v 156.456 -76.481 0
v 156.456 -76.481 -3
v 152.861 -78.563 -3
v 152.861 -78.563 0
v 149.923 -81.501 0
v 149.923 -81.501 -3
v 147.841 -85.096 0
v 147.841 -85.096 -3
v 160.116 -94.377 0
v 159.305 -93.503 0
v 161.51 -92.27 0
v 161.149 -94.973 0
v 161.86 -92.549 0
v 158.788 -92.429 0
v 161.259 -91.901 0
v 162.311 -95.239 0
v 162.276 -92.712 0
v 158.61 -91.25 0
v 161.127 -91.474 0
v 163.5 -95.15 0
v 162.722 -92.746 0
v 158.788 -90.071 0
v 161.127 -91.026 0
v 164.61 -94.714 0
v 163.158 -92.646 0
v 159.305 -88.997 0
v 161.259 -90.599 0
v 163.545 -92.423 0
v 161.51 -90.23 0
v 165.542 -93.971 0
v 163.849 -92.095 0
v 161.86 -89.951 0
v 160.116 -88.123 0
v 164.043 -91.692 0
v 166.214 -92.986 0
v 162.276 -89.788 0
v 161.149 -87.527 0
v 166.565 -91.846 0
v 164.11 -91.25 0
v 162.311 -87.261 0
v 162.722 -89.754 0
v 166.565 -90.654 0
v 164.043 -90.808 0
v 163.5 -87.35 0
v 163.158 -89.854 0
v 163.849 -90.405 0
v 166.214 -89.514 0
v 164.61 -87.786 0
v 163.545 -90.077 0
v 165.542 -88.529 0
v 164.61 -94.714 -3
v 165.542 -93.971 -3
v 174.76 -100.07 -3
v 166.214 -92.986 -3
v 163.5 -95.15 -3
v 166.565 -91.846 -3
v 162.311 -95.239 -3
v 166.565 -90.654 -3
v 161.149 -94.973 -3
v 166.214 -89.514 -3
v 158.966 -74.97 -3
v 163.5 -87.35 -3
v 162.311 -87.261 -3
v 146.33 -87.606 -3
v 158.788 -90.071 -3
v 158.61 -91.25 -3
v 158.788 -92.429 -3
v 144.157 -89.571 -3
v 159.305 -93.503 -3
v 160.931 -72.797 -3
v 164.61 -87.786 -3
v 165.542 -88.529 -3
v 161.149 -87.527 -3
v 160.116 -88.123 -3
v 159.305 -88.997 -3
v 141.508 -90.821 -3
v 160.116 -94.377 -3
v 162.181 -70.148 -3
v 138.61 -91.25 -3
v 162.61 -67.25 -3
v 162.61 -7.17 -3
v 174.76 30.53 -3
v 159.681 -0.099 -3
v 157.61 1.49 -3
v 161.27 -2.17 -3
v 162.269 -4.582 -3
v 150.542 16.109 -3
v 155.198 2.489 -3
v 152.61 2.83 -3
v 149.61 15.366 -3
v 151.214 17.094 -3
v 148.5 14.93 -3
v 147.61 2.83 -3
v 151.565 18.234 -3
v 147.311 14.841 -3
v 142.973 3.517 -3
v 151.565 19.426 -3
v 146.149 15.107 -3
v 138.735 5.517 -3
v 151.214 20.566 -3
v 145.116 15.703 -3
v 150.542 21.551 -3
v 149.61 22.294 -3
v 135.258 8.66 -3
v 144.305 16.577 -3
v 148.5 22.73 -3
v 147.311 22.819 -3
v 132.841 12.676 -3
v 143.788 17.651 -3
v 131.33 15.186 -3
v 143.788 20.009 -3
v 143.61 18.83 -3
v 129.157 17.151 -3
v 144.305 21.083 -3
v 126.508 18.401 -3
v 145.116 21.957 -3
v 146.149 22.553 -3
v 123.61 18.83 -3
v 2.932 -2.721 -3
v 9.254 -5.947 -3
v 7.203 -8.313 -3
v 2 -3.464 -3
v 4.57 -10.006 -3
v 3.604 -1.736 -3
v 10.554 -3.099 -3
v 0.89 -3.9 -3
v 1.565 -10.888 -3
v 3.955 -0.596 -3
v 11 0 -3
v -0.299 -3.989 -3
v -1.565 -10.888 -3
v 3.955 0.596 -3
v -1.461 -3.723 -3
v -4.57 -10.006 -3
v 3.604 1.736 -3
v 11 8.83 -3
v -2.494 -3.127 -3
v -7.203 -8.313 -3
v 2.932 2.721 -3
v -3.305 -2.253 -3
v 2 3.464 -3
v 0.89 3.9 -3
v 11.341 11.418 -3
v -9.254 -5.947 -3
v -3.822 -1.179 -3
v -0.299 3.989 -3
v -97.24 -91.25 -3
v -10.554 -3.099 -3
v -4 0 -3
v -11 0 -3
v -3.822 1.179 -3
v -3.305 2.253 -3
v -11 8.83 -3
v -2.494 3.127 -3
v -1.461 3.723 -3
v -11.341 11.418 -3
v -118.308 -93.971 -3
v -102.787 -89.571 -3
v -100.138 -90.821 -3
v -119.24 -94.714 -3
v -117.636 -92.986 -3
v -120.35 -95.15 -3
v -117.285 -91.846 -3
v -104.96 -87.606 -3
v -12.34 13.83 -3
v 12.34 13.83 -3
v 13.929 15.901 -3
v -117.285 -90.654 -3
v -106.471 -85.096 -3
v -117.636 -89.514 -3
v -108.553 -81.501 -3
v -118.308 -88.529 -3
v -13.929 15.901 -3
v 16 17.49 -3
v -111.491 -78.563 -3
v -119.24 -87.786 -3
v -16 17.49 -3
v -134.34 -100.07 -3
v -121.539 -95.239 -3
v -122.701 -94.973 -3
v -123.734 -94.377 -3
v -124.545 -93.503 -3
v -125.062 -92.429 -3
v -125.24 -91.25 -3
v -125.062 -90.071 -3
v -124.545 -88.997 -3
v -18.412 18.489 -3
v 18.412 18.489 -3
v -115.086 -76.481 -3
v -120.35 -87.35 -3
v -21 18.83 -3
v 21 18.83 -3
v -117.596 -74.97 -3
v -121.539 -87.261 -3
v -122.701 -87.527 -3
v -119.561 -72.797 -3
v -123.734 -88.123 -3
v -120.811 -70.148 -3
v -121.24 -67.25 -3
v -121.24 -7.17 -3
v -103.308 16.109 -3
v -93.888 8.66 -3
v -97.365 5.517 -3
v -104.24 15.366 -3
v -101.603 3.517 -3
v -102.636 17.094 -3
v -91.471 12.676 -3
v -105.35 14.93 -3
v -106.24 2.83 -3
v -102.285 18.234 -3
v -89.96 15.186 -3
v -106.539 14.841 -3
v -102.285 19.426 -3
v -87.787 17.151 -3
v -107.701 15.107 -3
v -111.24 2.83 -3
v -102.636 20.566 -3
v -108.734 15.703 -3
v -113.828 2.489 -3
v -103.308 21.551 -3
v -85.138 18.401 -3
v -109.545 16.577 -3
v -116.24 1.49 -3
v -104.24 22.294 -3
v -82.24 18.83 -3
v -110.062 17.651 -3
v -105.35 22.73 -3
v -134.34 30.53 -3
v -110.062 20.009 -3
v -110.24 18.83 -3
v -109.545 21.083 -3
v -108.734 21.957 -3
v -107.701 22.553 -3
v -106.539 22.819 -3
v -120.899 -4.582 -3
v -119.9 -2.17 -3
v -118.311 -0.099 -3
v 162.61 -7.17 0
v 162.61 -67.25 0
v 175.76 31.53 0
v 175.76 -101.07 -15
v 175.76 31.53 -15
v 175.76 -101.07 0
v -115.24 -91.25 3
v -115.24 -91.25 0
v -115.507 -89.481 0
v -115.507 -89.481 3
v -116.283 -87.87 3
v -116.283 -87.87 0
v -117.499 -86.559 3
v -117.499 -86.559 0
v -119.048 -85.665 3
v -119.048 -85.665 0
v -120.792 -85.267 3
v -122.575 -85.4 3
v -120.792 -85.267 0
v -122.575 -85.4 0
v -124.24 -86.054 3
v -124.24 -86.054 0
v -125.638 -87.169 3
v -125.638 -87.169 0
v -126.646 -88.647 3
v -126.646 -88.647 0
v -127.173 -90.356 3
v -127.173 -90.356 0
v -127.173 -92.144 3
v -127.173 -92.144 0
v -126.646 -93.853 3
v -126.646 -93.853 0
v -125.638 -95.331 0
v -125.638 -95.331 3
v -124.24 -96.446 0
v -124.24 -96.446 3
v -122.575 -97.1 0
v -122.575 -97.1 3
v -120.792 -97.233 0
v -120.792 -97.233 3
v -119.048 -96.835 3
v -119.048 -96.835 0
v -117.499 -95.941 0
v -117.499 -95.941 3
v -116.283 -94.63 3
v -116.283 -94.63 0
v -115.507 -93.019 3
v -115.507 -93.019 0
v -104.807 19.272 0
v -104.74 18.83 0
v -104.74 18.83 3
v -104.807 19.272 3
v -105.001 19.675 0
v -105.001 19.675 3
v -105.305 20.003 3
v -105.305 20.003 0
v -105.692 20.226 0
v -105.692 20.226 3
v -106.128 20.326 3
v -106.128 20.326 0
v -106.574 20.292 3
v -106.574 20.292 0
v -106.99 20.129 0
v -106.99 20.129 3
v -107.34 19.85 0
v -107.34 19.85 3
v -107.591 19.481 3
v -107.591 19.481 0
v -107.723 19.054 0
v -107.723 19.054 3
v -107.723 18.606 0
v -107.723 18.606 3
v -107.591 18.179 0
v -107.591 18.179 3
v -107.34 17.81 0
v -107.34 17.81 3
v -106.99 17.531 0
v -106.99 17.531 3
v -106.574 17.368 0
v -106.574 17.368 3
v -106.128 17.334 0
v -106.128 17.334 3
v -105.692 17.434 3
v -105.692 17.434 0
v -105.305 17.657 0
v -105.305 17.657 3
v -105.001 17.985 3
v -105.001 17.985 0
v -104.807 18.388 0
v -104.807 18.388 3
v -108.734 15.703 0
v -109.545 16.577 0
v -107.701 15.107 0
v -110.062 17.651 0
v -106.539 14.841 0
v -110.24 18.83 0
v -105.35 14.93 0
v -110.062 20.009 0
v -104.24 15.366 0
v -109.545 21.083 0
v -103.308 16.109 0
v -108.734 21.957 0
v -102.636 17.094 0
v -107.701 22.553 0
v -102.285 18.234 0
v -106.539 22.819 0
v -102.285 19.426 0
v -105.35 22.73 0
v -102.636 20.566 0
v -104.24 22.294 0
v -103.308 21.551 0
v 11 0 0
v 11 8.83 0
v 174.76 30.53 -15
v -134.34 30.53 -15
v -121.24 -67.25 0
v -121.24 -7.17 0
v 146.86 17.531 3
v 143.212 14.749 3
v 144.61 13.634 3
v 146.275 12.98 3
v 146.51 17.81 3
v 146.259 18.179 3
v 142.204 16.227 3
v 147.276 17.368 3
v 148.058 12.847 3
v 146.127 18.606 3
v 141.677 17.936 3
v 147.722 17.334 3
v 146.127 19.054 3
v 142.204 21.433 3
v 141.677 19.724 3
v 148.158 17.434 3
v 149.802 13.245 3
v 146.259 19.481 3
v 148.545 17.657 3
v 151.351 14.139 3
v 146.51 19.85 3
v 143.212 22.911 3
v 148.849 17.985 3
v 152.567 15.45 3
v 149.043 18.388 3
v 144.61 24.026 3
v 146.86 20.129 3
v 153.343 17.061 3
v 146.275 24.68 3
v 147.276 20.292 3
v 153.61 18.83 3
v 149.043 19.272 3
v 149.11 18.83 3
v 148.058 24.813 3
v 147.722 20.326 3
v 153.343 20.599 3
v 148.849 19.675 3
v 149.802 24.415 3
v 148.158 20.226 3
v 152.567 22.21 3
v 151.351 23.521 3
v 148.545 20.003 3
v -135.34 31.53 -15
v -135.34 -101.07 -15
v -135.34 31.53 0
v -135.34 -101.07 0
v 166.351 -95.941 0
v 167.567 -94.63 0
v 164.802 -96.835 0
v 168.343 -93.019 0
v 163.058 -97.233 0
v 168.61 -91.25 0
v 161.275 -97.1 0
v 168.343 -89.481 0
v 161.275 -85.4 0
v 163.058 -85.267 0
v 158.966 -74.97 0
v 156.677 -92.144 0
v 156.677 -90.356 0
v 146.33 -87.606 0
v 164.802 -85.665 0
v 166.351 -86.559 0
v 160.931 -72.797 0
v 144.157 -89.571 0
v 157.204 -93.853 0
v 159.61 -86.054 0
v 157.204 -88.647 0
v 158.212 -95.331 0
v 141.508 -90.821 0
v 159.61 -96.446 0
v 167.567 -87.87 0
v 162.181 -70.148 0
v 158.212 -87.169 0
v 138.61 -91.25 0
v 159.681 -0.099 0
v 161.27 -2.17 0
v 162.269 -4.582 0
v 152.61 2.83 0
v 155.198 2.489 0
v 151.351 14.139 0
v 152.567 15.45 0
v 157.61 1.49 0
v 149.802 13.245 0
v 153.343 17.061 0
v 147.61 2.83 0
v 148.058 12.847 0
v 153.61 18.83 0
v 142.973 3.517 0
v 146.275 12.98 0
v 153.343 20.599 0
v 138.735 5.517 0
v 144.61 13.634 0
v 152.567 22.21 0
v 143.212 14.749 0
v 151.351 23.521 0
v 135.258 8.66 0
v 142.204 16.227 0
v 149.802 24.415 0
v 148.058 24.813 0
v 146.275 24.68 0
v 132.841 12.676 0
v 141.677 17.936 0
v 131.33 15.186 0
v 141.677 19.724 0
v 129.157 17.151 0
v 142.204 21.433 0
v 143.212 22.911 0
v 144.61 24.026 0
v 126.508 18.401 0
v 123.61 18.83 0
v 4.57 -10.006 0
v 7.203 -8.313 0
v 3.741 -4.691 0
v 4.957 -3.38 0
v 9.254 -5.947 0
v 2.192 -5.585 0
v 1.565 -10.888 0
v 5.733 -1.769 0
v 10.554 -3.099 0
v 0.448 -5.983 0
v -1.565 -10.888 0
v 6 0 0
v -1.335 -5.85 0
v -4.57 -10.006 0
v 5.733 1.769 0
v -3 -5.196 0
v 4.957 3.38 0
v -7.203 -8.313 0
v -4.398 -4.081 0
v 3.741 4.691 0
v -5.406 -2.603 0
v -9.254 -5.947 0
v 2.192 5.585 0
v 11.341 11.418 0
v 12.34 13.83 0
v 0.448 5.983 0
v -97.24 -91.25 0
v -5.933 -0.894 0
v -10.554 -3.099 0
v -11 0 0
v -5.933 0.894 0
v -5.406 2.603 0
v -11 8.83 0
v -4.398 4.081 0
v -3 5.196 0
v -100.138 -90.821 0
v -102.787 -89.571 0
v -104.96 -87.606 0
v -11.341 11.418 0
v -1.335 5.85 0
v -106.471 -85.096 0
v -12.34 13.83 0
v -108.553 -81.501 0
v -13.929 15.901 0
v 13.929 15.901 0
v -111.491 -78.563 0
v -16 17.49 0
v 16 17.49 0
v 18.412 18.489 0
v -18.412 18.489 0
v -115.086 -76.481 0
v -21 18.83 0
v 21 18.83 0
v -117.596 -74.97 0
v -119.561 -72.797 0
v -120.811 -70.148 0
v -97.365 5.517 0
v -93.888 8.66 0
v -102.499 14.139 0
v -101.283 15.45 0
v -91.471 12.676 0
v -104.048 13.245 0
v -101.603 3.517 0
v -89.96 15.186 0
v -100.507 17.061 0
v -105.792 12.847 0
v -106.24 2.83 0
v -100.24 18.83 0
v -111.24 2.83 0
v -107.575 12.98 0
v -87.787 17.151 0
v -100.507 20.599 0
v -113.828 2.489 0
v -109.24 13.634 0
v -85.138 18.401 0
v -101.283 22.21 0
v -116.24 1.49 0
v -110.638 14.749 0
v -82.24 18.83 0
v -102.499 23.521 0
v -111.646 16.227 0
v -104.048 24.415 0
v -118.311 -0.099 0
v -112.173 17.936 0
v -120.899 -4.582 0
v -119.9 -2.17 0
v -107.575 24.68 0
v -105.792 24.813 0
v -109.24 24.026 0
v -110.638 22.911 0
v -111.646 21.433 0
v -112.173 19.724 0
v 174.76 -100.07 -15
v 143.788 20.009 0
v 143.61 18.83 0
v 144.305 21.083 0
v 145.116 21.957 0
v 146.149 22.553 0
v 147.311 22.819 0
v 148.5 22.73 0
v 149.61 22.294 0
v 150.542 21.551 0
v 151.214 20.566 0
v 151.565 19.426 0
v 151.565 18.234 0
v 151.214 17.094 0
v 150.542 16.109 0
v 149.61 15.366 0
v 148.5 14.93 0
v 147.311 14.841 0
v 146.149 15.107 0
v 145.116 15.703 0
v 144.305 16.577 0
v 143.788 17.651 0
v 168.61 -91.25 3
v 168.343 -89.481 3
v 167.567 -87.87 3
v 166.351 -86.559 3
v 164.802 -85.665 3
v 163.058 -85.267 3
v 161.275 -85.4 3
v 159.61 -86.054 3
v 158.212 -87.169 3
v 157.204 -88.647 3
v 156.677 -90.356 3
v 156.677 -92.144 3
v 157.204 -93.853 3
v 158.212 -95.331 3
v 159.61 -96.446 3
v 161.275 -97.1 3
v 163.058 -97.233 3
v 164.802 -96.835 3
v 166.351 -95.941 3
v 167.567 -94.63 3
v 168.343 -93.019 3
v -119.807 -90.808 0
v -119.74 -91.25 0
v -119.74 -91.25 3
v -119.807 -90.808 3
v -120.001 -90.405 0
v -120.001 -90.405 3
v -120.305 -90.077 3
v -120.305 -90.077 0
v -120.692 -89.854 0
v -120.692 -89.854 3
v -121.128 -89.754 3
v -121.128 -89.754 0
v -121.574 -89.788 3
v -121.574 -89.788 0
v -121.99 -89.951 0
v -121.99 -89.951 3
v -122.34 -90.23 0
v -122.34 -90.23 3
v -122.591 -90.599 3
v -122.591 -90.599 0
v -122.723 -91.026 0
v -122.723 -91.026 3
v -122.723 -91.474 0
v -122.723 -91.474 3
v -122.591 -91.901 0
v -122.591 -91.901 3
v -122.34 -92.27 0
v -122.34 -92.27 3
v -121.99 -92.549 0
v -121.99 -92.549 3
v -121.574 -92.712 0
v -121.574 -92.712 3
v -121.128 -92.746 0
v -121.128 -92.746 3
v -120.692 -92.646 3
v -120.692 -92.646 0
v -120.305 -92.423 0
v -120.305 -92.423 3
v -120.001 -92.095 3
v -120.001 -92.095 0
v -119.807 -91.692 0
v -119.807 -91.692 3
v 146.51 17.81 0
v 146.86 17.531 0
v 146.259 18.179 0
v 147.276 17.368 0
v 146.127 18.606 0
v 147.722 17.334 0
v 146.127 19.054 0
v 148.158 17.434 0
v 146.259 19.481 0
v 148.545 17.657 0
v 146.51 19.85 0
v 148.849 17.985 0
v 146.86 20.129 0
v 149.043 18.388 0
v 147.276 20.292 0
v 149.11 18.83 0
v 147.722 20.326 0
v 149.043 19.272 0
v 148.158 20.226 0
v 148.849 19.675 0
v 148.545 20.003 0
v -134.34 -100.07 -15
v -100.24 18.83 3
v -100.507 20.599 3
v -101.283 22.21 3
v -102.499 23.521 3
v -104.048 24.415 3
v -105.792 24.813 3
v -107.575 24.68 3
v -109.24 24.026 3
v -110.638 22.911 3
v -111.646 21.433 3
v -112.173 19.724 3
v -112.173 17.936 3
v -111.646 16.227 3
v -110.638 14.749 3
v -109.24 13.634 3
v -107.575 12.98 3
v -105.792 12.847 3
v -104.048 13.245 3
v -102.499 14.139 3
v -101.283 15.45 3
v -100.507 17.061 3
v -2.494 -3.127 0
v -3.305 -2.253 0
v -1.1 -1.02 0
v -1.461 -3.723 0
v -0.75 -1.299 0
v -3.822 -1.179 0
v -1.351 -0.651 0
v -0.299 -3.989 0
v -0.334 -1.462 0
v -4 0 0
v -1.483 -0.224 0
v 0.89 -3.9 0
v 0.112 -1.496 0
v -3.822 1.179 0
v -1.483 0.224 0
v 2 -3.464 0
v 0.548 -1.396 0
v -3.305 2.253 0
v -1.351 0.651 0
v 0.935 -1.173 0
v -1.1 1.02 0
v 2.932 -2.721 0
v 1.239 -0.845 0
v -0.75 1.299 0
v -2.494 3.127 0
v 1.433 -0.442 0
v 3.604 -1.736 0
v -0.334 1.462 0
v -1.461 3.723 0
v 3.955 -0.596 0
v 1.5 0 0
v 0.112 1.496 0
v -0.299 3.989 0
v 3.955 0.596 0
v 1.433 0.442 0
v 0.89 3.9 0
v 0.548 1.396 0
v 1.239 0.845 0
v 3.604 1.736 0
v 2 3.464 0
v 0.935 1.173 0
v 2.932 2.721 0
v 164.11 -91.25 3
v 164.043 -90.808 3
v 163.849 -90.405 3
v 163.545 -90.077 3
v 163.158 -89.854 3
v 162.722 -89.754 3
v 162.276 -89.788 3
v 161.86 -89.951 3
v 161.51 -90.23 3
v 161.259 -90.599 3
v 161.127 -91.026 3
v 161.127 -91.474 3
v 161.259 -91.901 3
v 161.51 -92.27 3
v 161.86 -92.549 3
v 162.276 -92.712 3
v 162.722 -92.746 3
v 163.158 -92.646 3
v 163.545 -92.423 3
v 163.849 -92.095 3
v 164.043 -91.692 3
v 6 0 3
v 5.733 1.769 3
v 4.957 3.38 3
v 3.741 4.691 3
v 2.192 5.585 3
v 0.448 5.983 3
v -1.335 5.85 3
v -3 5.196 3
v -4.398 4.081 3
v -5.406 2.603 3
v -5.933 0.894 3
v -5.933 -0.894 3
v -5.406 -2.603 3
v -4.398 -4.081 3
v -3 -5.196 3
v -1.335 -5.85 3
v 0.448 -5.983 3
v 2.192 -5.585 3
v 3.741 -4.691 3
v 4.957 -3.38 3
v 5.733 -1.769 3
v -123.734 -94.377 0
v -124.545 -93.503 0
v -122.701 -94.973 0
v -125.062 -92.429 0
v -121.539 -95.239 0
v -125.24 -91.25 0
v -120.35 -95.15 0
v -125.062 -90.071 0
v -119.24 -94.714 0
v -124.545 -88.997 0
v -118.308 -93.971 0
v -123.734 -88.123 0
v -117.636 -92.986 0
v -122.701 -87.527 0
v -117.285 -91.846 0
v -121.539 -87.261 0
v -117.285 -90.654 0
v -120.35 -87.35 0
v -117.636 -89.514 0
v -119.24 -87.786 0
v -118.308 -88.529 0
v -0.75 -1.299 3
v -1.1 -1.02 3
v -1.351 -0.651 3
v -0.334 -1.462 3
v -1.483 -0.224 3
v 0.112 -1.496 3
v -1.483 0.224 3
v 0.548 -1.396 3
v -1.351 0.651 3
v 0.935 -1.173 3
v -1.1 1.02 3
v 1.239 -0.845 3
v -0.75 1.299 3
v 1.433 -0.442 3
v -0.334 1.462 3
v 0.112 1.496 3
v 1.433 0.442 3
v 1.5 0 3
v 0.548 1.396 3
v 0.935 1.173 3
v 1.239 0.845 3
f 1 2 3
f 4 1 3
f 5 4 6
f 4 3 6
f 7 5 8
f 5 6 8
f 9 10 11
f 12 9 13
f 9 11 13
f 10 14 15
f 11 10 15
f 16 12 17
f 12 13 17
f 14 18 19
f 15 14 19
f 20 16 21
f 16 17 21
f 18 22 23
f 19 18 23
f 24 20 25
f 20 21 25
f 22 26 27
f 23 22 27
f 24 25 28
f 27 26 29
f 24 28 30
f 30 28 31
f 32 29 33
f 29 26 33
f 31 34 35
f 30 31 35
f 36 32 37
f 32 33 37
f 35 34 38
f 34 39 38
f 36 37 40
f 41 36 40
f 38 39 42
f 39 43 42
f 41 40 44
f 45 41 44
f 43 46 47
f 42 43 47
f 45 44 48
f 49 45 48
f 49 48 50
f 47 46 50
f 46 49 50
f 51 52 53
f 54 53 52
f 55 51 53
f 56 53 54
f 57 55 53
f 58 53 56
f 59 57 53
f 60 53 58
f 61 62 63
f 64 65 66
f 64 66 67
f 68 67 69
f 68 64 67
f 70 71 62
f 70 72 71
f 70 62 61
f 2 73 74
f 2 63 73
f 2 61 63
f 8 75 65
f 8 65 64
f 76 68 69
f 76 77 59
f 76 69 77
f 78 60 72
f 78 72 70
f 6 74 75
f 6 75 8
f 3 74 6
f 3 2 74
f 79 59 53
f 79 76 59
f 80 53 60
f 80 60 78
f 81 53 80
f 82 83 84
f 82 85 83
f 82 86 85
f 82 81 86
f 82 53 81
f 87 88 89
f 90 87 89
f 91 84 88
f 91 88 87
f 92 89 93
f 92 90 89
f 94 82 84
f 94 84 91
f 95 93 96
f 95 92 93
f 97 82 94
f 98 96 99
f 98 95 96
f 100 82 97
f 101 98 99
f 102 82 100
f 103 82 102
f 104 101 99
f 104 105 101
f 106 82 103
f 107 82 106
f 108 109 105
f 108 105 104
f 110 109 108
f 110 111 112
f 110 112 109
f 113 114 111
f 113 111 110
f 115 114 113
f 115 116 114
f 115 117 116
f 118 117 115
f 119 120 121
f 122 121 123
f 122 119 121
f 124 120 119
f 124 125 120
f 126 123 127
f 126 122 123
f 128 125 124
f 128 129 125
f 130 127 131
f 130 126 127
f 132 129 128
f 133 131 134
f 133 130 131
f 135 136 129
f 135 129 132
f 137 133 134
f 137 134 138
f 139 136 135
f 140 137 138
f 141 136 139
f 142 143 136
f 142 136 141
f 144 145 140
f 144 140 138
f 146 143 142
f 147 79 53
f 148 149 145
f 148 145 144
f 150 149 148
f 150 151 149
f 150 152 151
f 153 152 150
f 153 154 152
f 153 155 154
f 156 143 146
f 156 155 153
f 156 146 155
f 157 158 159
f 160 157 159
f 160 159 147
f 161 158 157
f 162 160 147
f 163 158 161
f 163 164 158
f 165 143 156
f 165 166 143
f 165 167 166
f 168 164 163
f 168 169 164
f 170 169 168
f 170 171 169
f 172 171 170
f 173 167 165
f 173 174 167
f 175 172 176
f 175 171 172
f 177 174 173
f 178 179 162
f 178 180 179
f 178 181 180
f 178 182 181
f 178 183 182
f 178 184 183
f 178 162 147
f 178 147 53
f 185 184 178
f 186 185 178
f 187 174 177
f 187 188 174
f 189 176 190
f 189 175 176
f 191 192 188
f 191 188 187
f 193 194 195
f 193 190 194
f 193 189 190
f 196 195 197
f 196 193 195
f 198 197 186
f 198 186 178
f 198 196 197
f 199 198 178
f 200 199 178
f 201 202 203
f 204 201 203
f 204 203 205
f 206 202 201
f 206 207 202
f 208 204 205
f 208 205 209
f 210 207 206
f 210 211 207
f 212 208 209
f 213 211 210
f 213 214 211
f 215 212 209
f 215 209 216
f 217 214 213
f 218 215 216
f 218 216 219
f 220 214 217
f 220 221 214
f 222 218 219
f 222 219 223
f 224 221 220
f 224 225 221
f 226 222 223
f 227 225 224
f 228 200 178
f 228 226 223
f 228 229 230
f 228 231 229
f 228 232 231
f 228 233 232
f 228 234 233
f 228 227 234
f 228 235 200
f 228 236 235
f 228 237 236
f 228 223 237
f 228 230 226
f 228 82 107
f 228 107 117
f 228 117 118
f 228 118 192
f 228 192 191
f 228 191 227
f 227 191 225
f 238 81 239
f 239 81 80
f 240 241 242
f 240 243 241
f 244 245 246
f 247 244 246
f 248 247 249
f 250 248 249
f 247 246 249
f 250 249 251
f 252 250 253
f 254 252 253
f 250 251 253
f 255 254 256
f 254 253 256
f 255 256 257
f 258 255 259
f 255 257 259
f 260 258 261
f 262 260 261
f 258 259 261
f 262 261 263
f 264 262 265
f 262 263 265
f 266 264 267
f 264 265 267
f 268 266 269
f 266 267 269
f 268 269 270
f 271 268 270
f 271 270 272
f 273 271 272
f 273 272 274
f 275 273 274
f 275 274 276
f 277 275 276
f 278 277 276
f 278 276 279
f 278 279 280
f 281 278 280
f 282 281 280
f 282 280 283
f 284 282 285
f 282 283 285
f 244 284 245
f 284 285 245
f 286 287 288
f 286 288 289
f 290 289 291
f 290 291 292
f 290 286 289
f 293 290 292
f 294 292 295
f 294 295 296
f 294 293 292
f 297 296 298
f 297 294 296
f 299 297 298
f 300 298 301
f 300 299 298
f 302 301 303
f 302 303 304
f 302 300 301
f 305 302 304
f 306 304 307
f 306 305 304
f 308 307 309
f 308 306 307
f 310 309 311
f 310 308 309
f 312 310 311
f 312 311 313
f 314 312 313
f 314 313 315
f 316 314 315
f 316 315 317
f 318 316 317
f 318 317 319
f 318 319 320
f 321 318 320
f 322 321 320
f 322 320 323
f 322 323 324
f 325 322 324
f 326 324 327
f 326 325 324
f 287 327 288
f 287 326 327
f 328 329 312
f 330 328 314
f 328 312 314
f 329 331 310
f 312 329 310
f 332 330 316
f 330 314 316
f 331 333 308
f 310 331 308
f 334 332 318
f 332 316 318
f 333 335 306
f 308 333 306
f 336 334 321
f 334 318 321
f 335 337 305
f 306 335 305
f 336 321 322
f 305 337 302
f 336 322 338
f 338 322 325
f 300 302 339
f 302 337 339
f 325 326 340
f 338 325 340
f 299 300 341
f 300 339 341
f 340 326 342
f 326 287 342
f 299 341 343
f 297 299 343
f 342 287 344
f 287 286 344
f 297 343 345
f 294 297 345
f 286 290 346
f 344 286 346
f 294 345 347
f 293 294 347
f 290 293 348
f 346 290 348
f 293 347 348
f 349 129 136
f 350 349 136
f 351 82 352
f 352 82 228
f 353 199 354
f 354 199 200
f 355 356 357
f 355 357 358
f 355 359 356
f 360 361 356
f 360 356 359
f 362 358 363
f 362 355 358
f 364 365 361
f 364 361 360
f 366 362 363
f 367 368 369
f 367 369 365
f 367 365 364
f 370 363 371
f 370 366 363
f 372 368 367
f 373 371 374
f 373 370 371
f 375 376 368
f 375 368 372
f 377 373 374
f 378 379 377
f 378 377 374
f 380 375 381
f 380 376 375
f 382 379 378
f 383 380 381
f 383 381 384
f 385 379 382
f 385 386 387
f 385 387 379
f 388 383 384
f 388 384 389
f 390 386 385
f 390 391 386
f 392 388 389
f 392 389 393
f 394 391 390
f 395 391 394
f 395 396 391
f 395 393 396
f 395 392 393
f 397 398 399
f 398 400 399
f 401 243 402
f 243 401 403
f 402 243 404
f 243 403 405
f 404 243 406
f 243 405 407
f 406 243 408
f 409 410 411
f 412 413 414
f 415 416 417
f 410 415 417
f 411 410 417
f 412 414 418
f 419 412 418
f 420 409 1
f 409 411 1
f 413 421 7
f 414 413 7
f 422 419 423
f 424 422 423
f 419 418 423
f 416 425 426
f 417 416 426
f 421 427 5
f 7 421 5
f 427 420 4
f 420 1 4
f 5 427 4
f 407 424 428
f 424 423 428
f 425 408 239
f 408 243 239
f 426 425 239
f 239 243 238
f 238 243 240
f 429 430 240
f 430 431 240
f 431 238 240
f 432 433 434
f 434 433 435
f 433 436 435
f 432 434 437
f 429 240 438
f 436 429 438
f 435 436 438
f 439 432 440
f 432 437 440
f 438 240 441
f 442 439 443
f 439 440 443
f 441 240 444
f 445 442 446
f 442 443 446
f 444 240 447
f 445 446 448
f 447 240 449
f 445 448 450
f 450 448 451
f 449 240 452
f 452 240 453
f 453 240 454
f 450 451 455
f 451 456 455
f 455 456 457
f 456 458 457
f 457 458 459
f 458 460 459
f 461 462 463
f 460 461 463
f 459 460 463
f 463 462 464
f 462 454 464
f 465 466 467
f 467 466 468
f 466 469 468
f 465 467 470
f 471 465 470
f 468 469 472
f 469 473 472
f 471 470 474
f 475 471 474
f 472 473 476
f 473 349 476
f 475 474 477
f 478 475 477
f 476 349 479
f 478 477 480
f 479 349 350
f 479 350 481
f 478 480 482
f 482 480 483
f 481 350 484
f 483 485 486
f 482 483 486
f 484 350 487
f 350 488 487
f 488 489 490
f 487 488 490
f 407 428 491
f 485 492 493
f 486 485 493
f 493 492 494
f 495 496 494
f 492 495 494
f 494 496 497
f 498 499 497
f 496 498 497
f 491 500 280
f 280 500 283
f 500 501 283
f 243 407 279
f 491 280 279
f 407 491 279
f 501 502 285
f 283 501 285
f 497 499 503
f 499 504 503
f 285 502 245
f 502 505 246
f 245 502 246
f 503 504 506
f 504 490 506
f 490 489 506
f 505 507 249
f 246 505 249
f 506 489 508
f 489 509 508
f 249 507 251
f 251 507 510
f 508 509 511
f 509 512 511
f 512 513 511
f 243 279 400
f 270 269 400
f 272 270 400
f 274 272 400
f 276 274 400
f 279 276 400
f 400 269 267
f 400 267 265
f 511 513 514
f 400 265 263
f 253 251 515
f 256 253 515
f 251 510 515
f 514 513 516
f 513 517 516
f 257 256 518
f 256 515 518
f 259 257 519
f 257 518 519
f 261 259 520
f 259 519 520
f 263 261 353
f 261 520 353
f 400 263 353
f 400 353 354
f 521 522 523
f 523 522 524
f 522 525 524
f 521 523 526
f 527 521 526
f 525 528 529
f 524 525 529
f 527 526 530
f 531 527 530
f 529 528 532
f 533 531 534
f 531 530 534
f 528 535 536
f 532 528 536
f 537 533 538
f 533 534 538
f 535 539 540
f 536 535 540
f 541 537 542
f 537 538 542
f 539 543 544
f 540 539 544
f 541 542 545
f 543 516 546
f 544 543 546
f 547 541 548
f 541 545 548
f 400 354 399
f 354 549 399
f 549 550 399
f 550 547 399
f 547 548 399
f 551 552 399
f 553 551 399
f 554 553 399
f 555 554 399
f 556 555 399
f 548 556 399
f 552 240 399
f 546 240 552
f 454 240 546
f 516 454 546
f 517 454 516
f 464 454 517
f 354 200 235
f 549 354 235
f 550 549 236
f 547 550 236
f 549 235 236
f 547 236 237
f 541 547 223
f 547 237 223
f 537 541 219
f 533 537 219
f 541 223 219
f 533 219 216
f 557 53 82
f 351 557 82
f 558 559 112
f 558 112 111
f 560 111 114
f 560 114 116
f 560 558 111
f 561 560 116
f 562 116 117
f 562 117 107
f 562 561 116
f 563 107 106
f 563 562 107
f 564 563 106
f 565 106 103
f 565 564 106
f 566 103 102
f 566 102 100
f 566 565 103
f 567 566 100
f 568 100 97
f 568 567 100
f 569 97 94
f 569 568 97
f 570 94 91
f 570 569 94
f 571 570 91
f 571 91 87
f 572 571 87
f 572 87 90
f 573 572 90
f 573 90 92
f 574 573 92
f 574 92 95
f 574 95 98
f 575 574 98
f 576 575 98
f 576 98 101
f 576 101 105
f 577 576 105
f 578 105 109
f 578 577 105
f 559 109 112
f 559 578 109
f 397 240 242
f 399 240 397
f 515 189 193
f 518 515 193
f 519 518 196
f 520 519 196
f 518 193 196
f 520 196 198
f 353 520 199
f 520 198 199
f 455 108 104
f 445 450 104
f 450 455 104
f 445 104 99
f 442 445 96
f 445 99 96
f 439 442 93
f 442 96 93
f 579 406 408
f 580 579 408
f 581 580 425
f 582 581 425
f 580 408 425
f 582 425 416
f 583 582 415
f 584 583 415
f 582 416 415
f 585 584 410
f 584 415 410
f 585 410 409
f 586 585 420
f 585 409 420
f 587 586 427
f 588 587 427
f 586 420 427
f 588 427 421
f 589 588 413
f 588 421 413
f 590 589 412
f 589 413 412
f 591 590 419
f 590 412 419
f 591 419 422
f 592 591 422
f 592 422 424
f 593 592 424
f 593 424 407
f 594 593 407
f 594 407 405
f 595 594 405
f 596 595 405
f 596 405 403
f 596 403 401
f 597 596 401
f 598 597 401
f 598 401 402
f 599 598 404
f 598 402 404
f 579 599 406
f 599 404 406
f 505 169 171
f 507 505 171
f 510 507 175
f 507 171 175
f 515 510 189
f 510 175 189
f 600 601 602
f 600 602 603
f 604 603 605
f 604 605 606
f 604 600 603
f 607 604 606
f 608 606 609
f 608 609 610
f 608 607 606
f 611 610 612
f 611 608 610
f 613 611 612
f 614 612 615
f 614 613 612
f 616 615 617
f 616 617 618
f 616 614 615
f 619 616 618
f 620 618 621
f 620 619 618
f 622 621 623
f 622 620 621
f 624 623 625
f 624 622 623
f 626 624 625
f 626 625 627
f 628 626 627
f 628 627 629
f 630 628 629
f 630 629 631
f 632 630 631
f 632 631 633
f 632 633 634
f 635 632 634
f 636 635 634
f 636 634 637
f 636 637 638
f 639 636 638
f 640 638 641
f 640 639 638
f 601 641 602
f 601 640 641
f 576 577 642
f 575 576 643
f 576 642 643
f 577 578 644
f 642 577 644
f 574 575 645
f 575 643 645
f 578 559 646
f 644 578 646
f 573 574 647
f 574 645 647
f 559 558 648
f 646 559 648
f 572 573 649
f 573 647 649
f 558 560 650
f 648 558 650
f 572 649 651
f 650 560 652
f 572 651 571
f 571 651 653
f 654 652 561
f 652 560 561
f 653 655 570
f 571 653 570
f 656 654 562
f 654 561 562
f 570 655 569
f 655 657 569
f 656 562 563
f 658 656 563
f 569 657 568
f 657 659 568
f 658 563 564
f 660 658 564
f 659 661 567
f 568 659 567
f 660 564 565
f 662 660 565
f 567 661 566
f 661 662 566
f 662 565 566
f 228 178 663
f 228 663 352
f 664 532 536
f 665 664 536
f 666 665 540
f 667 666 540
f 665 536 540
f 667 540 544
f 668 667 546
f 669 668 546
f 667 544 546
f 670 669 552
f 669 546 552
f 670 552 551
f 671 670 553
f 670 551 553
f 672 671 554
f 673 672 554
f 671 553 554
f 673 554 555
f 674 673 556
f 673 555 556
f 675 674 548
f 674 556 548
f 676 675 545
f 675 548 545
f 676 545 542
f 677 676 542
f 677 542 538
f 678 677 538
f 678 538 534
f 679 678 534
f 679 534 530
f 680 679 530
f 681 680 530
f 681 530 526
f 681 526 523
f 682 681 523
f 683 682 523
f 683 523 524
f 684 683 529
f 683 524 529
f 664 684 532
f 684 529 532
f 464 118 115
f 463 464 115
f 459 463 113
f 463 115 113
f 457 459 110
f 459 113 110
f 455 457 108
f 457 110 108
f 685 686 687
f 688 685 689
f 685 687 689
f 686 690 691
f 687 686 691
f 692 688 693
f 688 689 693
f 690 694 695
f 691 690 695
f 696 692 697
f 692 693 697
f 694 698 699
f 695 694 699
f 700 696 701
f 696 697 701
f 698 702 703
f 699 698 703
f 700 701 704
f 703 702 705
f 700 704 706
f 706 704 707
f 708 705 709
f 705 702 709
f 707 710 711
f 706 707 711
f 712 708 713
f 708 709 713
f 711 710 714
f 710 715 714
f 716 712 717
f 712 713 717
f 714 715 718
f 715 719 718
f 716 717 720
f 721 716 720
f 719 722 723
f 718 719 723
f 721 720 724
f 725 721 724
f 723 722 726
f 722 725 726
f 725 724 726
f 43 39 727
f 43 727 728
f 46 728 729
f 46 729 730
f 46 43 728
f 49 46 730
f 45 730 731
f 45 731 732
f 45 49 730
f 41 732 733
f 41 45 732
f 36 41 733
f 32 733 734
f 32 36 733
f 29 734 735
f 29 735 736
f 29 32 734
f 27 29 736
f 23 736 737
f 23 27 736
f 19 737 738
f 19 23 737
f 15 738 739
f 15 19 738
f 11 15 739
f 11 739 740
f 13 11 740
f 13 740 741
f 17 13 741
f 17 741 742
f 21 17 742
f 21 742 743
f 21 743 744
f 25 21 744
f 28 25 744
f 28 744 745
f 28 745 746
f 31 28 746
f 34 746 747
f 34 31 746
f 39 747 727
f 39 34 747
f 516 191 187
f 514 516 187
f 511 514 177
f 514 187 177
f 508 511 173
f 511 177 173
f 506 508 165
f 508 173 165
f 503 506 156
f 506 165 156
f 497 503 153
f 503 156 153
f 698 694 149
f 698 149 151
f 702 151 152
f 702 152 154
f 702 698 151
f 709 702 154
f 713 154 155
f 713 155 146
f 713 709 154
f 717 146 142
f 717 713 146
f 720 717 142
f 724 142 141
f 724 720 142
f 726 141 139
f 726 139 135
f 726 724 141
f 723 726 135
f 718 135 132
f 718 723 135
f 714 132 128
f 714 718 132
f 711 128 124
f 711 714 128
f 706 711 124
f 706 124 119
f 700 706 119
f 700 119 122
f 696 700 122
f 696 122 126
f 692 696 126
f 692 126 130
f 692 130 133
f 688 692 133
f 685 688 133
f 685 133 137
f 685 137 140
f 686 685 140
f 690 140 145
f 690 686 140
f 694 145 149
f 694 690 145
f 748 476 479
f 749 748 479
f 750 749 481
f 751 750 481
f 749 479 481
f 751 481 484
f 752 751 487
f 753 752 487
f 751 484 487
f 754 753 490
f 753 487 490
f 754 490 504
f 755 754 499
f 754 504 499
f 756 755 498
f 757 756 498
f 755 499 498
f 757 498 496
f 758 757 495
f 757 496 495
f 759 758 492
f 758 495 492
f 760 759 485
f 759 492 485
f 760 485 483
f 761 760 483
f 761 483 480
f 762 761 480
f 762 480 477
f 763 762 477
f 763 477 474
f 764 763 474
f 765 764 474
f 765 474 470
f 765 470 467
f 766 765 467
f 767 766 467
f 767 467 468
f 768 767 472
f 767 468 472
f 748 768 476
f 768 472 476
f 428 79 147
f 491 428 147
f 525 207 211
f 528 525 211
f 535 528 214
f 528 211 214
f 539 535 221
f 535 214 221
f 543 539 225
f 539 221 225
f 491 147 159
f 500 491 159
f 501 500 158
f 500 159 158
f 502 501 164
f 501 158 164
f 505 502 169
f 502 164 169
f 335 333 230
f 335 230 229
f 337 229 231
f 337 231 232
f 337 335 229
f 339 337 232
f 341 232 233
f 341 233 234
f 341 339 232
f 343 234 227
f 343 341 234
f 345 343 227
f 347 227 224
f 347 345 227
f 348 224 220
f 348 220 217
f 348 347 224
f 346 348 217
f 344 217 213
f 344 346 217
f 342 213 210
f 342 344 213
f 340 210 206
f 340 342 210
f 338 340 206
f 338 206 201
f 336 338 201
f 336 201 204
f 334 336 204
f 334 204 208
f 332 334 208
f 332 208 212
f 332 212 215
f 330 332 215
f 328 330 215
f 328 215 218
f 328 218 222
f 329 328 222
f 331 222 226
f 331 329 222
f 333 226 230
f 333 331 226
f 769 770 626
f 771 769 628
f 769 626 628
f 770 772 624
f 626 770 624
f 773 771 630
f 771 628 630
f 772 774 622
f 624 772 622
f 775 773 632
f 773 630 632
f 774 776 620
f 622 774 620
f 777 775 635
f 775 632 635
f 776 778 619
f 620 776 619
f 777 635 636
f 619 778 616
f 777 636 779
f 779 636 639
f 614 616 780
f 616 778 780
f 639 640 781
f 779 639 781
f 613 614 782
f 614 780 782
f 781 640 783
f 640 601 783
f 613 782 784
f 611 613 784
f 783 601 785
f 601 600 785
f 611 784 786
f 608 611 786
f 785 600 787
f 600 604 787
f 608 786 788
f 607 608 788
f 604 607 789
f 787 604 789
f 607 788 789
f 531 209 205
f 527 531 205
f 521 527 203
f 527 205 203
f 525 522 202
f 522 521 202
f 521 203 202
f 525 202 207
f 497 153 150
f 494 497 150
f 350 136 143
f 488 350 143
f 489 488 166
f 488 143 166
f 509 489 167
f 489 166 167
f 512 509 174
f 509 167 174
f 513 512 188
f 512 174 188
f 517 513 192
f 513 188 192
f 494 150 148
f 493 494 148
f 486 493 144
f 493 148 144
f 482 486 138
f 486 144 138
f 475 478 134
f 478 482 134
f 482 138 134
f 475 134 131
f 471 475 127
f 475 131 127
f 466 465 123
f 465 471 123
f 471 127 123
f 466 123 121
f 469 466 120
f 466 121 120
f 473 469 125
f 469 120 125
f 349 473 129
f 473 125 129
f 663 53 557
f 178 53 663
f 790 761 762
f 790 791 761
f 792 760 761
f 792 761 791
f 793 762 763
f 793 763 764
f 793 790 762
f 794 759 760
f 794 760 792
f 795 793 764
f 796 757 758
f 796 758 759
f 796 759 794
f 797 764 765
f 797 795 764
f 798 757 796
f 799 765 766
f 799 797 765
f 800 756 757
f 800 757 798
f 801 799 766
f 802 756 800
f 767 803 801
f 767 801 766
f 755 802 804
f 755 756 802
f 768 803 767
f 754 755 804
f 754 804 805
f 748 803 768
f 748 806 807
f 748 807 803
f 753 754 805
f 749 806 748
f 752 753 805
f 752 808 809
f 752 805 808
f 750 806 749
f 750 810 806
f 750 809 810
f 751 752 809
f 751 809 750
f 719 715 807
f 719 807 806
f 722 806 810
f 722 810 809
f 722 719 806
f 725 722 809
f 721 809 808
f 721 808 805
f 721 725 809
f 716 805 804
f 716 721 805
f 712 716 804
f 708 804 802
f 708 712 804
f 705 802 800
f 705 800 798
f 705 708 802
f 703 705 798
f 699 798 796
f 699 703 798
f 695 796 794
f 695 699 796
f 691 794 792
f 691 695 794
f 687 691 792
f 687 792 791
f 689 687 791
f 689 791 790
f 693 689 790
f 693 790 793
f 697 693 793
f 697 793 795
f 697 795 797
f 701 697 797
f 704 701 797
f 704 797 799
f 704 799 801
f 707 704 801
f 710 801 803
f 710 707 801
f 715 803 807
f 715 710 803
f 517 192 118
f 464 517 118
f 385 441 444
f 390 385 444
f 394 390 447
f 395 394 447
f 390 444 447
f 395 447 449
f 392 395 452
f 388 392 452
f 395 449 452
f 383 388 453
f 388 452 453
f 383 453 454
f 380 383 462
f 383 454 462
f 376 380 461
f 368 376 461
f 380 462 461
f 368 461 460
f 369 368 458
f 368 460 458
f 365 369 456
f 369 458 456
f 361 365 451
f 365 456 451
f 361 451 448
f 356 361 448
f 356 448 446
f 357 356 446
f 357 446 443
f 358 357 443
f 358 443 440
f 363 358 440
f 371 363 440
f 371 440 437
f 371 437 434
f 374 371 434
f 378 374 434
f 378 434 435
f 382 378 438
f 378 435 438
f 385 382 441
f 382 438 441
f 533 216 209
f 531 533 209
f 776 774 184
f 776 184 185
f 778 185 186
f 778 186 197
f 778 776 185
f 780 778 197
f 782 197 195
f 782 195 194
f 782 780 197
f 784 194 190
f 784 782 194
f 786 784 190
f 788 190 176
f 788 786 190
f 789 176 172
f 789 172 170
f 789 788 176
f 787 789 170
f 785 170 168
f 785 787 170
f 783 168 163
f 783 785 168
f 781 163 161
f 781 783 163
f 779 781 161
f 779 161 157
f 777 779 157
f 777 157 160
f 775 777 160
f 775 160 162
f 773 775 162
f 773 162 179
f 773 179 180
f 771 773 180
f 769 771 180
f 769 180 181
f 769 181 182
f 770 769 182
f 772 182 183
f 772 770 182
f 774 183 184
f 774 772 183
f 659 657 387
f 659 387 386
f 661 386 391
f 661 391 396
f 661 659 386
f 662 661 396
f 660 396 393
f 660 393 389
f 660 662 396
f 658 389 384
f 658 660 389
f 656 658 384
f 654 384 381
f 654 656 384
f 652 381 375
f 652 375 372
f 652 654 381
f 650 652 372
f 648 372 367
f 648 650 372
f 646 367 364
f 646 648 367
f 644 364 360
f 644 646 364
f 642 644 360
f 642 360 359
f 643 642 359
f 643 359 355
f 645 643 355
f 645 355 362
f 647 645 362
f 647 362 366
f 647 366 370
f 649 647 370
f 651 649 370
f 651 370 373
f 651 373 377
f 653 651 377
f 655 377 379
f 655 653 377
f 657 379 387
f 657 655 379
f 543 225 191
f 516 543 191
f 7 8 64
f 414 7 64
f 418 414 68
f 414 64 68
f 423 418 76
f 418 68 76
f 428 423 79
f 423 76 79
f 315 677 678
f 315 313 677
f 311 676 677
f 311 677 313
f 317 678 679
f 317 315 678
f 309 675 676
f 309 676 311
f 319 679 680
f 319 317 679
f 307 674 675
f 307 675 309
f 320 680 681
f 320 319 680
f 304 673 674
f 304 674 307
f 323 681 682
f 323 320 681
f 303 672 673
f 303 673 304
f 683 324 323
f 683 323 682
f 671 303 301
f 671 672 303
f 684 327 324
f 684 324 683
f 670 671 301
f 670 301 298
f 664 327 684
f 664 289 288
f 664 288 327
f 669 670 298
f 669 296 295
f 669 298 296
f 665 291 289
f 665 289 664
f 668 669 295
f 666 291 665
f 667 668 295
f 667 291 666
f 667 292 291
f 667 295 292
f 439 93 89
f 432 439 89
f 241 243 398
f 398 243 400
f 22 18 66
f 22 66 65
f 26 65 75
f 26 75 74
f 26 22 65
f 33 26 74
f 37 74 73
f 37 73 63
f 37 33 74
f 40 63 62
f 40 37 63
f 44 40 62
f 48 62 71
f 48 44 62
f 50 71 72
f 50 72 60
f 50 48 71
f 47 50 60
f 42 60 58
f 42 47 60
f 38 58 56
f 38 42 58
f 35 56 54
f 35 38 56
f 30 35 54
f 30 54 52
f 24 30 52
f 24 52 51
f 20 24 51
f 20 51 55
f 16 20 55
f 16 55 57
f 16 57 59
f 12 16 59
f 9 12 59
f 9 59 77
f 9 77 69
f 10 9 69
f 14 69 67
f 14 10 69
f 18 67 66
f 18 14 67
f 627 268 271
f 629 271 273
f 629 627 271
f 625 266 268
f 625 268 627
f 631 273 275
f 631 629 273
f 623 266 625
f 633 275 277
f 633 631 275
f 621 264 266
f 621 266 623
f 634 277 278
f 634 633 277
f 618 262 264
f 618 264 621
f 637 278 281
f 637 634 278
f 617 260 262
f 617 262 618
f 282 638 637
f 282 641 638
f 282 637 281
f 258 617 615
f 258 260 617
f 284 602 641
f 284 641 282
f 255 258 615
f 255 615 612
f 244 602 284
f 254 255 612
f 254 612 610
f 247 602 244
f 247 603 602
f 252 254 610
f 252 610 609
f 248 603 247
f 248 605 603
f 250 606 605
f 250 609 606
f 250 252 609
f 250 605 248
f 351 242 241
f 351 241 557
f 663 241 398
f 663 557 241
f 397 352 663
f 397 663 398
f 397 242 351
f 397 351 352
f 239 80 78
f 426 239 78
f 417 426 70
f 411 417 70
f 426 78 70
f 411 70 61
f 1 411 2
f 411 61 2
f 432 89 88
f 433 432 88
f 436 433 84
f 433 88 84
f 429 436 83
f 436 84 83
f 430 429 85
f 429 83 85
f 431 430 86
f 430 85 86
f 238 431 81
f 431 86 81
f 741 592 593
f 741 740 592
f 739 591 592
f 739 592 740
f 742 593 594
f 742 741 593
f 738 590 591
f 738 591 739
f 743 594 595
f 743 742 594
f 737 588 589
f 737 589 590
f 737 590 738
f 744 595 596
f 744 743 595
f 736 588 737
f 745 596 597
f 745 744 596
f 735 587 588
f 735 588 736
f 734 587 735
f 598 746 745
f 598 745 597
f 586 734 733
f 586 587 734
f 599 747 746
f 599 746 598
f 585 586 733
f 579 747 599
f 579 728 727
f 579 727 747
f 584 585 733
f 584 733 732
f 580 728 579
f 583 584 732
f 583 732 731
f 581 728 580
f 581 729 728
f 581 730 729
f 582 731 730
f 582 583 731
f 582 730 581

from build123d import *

# Parameters (mm, degrees)
SKETCH1_R                             = 6
SKETCH1_R_2                           = 1.5
DISPLAY_SCREW_PATTERN_DEPTH           = 3
DISPLAY_SCREW_PATTERN_2_DEPTH         = 3
DISPLAY_SCREW_PATTERN_3_DEPTH         = 3
DISPLAY_SCREW_PATTERN_4_DEPTH         = 3
DISPLAY_SCREW_PATTERN_5_DEPTH         = 3
SKETCH2_W                             = 311.1
SKETCH2_H                             = 132.6
SKETCH2_R                             = 4
DISPLAY_BACKPLANE_DEPTH               = 3
BACKPLANE_WEIGHT_REDUCTION_DEPTH      = 203.770122306
BACKPLANE_WEIGHT_REDUCTION_DEPTH_BACK = 203.770122306
SKETCH4_W                             = 311.1
SKETCH4_H                             = 132.6
SKETCH4_W_2                           = 309.1
SKETCH4_H_2                           = 130.6
DISPLAY_OUTSIDE_CRADDLE_DEPTH         = 12


with BuildPart() as part:
    # Sketch1 → Display screw pattern (new body)
    with BuildSketch(Plane.XY):
        Circle(SKETCH1_R)
        Circle(SKETCH1_R_2, mode=Mode.SUBTRACT)
    extrude(amount=DISPLAY_SCREW_PATTERN_DEPTH)



with BuildPart() as body_2:
    # Sketch1 → Display screw pattern 2 (new body)
    with BuildSketch(Plane.XY):
        with Locations((-106.24, 18.83)):
            Circle(SKETCH1_R)
        with Locations((-106.24, 18.83)):
            Circle(SKETCH1_R_2, mode=Mode.SUBTRACT)
    extrude(amount=DISPLAY_SCREW_PATTERN_2_DEPTH)


with BuildPart() as body_3:
    # Sketch1 → Display screw pattern 3 (new body)
    with BuildSketch(Plane.XY):
        with Locations((147.61, 18.83)):
            Circle(SKETCH1_R)
        with Locations((147.61, 18.83)):
            Circle(SKETCH1_R_2, mode=Mode.SUBTRACT)
    extrude(amount=DISPLAY_SCREW_PATTERN_3_DEPTH)


with BuildPart() as body_4:
    # Sketch1 → Display screw pattern 4 (new body)
    with BuildSketch(Plane.XY):
        with Locations((-121.24, -91.25)):
            Circle(SKETCH1_R)
        with Locations((-121.24, -91.25)):
            Circle(SKETCH1_R_2, mode=Mode.SUBTRACT)
    extrude(amount=DISPLAY_SCREW_PATTERN_4_DEPTH)


with BuildPart() as body_5:
    # Sketch1 → Display screw pattern 5 (new body)
    with BuildSketch(Plane.XY):
        with Locations((162.61, -91.25)):
            Circle(SKETCH1_R)
        with Locations((162.61, -91.25)):
            Circle(SKETCH1_R_2, mode=Mode.SUBTRACT)
    extrude(amount=DISPLAY_SCREW_PATTERN_5_DEPTH)


with BuildPart() as part_1:
    add(part.part)

    add(body_2.part)  # Display backplane merges body 2

    add(body_3.part)  # Display backplane merges body 3

    add(body_4.part)  # Display backplane merges body 4

    add(body_5.part)  # Display backplane merges body 5
    # Sketch2 → Display backplane (add)
    with BuildSketch(Plane(origin=(0, 0, 0), x_dir=(-1, 0, 0), z_dir=(0, 0, -1))):
        with Locations((-20.21, -34.77)):
            Rectangle(SKETCH2_W, SKETCH2_H)
        with Locations((106.24, 18.83)):
            Circle(SKETCH2_R, mode=Mode.SUBTRACT)
        Circle(SKETCH2_R, mode=Mode.SUBTRACT)
        with Locations((121.24, -91.25)):
            Circle(SKETCH2_R, mode=Mode.SUBTRACT)
        with Locations((-147.61, 18.83)):
            Circle(SKETCH2_R, mode=Mode.SUBTRACT)
        with Locations((-162.61, -91.25)):
            Circle(SKETCH2_R, mode=Mode.SUBTRACT)
    extrude(amount=DISPLAY_BACKPLANE_DEPTH)

    # Sketch3 → Backplane weight reduction (cut, two sides: drawn at the far end of the back side and taken through both)
    with BuildSketch(Plane.XY.offset(-BACKPLANE_WEIGHT_REDUCTION_DEPTH_BACK)):
        with BuildLine():
            Line((162.61, -7.17), (162.61, -67.25))
            ThreePointArc((162.61, -67.25), (160.930502943, -72.797001962), (156.456153846, -76.480769231))
            ThreePointArc((156.456153846, -76.480769231), (151.296291501, -79.936291501), (147.840769231, -85.096153846))
            ThreePointArc((147.840769231, -85.096153846), (144.157001962, -89.570502943), (138.61, -91.25))
            Line((138.61, -91.25), (-97.24, -91.25))
            ThreePointArc((-97.24, -91.25), (-102.787001962, -89.570502943), (-106.470769231, -85.096153846))
            ThreePointArc((-106.470769231, -85.096153846), (-109.926291501, -79.936291501), (-115.086153846, -76.480769231))
            ThreePointArc((-115.086153846, -76.480769231), (-119.560502943, -72.797001962), (-121.24, -67.25))
            Line((-121.24, -67.25), (-121.24, -7.17))
            ThreePointArc((-121.24, -7.17), (-118.311067812, -0.098932188), (-111.24, 2.83))
            Line((-111.24, 2.83), (-106.24, 2.83))
            ThreePointArc((-106.24, 2.83), (-97.36479686, 5.517195291), (-91.470769231, 12.676153846))
            ThreePointArc((-91.470769231, 12.676153846), (-87.787001962, 17.150502943), (-82.24, 18.83))
            Line((-82.24, 18.83), (-21, 18.83))
            ThreePointArc((-21, 18.83), (-13.928932188, 15.901067812), (-11, 8.83))
            Line((-11, 8.83), (-11, 0))
            ThreePointArc((-11, 0), (0, -11), (11, 0))
            Line((11, 0), (11, 8.83))
            ThreePointArc((11, 8.83), (13.928932188, 15.901067812), (21, 18.83))
            Line((21, 18.83), (123.61, 18.83))
            ThreePointArc((123.61, 18.83), (129.157001962, 17.150502943), (132.840769231, 12.676153846))
            ThreePointArc((132.840769231, 12.676153846), (138.73479686, 5.517195291), (147.61, 2.83))
            Line((147.61, 2.83), (152.61, 2.83))
            ThreePointArc((152.61, 2.83), (159.681067812, -0.098932188), (162.61, -7.17))
        make_face()
    extrude(amount=BACKPLANE_WEIGHT_REDUCTION_DEPTH + BACKPLANE_WEIGHT_REDUCTION_DEPTH_BACK, mode=Mode.SUBTRACT)

    # Sketch4 → Display outside craddle (add)
    with BuildSketch(Plane(origin=(0, 0, -3), x_dir=(-1, 0, 0), z_dir=(0, 0, -1))):
        with Locations((-20.21, -34.77)):
            Rectangle(SKETCH4_W, SKETCH4_H)
        with Locations((-20.21, -34.77)):
            Rectangle(SKETCH4_W_2, SKETCH4_H_2, mode=Mode.SUBTRACT)
    extrude(amount=DISPLAY_OUTSIDE_CRADDLE_DEPTH)


solid = part_1.part
